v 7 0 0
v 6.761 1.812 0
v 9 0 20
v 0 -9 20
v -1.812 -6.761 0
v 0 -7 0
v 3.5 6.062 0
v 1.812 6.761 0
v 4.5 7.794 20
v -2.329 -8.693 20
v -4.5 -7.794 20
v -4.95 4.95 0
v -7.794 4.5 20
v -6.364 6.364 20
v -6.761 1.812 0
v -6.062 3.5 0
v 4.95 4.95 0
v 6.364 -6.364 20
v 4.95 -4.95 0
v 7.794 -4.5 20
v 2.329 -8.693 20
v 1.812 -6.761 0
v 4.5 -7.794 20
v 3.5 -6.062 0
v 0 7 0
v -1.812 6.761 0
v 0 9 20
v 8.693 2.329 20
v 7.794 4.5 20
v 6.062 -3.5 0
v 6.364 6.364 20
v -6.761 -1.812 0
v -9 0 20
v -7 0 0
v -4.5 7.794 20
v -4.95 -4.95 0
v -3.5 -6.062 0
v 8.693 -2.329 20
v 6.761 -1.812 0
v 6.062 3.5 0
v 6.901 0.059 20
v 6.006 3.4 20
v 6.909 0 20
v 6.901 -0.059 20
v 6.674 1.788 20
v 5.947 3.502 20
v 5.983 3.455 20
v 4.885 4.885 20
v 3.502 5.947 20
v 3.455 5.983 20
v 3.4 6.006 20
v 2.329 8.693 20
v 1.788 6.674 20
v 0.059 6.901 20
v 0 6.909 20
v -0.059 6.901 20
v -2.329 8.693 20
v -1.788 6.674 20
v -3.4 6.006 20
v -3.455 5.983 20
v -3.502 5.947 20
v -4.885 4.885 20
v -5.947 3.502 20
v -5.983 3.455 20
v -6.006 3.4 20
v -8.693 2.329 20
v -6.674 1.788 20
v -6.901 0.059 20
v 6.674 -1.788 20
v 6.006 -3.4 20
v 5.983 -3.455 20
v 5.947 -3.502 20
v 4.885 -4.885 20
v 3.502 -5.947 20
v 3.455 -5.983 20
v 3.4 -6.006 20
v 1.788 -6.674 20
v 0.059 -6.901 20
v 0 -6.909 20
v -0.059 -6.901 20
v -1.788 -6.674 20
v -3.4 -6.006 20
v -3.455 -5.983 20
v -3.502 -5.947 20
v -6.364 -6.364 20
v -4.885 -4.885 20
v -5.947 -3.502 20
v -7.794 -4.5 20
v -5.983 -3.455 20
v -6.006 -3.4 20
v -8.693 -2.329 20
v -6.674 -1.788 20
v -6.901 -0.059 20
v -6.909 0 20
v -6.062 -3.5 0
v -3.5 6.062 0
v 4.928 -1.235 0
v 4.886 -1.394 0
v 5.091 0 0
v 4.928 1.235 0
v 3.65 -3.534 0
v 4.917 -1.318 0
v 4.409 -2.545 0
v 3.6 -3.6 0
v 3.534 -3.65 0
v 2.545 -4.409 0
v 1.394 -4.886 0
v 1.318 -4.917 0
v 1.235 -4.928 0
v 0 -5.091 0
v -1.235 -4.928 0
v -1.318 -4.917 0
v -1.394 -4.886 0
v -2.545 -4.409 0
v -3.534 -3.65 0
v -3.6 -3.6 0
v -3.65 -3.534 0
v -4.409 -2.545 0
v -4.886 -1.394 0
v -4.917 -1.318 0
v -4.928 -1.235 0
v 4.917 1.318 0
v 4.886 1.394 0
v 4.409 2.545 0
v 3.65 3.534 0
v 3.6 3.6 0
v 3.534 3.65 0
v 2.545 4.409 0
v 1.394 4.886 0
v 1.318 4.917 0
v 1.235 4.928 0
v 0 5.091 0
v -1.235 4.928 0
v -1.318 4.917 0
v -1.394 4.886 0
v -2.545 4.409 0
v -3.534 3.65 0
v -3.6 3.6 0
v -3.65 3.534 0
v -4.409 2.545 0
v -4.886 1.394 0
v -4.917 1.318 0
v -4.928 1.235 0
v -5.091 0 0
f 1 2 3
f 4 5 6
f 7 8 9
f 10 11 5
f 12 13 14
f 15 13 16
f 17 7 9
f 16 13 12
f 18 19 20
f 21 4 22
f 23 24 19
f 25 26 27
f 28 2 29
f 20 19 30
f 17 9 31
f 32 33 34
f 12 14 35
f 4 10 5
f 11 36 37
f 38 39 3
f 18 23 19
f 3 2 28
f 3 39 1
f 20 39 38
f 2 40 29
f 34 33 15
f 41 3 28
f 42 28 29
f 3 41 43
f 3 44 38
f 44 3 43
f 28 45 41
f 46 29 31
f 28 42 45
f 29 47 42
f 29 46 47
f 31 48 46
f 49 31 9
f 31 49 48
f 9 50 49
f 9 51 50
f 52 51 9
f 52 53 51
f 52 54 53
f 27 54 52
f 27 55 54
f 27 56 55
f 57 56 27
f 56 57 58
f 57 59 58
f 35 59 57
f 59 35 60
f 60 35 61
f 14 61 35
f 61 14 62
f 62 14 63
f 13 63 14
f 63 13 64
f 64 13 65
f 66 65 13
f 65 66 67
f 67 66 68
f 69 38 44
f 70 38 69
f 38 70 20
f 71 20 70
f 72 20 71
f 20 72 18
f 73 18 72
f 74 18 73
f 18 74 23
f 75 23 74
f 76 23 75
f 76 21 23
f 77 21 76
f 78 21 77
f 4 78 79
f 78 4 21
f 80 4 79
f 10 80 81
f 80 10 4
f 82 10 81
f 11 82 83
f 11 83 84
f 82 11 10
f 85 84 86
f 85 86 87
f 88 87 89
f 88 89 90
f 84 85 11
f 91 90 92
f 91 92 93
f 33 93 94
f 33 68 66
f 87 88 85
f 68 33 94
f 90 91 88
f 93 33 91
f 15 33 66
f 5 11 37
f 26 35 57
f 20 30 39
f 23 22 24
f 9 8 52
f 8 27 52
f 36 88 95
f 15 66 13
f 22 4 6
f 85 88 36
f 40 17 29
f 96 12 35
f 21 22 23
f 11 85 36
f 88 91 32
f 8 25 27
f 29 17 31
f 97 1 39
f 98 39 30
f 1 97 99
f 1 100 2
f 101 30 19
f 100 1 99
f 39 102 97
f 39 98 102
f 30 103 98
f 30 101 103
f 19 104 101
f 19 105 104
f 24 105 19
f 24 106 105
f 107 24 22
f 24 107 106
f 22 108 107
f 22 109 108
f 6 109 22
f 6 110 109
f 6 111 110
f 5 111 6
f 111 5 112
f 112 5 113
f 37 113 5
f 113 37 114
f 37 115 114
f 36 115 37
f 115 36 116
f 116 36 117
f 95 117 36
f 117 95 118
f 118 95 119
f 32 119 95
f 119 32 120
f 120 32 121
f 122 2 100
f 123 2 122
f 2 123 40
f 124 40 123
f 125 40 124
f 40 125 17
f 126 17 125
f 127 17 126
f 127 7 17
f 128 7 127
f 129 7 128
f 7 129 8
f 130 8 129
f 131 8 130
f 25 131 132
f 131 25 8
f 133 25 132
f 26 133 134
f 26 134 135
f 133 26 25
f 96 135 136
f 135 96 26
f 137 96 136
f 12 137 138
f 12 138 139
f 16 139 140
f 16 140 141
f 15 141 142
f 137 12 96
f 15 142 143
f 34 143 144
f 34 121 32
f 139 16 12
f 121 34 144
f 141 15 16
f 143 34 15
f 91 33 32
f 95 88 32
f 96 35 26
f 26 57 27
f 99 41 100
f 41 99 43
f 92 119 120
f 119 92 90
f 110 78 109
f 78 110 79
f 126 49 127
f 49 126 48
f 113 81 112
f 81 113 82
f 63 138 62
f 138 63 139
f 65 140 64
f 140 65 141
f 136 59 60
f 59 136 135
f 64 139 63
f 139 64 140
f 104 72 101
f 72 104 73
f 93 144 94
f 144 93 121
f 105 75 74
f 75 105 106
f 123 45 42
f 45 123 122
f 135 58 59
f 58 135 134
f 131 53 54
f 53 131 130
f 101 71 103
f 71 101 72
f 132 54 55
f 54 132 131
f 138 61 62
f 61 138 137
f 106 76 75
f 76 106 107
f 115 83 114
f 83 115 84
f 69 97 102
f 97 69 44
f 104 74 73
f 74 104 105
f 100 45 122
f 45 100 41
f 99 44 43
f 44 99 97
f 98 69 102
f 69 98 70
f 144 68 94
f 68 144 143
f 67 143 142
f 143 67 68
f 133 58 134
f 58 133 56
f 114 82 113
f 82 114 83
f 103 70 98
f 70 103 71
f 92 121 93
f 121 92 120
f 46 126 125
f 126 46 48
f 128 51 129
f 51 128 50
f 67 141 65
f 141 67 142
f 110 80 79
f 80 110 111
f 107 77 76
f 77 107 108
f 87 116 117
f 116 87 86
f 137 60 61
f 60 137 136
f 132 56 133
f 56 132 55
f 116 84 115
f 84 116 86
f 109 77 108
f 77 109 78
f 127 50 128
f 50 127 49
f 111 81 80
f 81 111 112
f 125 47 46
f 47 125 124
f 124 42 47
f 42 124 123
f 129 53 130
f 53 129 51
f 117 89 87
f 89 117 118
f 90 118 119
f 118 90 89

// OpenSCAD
// Generated by scadwright. Do not hand-edit —
// edit the Python source and regenerate.

$fn = 24;

// Funnel
difference() {
    cylinder(h=20, r1=7, r2=9, center=false);
    translate([0, 0, -1]) {
        cylinder(h=22, r1=5, r2=7, center=false);
    }
}
